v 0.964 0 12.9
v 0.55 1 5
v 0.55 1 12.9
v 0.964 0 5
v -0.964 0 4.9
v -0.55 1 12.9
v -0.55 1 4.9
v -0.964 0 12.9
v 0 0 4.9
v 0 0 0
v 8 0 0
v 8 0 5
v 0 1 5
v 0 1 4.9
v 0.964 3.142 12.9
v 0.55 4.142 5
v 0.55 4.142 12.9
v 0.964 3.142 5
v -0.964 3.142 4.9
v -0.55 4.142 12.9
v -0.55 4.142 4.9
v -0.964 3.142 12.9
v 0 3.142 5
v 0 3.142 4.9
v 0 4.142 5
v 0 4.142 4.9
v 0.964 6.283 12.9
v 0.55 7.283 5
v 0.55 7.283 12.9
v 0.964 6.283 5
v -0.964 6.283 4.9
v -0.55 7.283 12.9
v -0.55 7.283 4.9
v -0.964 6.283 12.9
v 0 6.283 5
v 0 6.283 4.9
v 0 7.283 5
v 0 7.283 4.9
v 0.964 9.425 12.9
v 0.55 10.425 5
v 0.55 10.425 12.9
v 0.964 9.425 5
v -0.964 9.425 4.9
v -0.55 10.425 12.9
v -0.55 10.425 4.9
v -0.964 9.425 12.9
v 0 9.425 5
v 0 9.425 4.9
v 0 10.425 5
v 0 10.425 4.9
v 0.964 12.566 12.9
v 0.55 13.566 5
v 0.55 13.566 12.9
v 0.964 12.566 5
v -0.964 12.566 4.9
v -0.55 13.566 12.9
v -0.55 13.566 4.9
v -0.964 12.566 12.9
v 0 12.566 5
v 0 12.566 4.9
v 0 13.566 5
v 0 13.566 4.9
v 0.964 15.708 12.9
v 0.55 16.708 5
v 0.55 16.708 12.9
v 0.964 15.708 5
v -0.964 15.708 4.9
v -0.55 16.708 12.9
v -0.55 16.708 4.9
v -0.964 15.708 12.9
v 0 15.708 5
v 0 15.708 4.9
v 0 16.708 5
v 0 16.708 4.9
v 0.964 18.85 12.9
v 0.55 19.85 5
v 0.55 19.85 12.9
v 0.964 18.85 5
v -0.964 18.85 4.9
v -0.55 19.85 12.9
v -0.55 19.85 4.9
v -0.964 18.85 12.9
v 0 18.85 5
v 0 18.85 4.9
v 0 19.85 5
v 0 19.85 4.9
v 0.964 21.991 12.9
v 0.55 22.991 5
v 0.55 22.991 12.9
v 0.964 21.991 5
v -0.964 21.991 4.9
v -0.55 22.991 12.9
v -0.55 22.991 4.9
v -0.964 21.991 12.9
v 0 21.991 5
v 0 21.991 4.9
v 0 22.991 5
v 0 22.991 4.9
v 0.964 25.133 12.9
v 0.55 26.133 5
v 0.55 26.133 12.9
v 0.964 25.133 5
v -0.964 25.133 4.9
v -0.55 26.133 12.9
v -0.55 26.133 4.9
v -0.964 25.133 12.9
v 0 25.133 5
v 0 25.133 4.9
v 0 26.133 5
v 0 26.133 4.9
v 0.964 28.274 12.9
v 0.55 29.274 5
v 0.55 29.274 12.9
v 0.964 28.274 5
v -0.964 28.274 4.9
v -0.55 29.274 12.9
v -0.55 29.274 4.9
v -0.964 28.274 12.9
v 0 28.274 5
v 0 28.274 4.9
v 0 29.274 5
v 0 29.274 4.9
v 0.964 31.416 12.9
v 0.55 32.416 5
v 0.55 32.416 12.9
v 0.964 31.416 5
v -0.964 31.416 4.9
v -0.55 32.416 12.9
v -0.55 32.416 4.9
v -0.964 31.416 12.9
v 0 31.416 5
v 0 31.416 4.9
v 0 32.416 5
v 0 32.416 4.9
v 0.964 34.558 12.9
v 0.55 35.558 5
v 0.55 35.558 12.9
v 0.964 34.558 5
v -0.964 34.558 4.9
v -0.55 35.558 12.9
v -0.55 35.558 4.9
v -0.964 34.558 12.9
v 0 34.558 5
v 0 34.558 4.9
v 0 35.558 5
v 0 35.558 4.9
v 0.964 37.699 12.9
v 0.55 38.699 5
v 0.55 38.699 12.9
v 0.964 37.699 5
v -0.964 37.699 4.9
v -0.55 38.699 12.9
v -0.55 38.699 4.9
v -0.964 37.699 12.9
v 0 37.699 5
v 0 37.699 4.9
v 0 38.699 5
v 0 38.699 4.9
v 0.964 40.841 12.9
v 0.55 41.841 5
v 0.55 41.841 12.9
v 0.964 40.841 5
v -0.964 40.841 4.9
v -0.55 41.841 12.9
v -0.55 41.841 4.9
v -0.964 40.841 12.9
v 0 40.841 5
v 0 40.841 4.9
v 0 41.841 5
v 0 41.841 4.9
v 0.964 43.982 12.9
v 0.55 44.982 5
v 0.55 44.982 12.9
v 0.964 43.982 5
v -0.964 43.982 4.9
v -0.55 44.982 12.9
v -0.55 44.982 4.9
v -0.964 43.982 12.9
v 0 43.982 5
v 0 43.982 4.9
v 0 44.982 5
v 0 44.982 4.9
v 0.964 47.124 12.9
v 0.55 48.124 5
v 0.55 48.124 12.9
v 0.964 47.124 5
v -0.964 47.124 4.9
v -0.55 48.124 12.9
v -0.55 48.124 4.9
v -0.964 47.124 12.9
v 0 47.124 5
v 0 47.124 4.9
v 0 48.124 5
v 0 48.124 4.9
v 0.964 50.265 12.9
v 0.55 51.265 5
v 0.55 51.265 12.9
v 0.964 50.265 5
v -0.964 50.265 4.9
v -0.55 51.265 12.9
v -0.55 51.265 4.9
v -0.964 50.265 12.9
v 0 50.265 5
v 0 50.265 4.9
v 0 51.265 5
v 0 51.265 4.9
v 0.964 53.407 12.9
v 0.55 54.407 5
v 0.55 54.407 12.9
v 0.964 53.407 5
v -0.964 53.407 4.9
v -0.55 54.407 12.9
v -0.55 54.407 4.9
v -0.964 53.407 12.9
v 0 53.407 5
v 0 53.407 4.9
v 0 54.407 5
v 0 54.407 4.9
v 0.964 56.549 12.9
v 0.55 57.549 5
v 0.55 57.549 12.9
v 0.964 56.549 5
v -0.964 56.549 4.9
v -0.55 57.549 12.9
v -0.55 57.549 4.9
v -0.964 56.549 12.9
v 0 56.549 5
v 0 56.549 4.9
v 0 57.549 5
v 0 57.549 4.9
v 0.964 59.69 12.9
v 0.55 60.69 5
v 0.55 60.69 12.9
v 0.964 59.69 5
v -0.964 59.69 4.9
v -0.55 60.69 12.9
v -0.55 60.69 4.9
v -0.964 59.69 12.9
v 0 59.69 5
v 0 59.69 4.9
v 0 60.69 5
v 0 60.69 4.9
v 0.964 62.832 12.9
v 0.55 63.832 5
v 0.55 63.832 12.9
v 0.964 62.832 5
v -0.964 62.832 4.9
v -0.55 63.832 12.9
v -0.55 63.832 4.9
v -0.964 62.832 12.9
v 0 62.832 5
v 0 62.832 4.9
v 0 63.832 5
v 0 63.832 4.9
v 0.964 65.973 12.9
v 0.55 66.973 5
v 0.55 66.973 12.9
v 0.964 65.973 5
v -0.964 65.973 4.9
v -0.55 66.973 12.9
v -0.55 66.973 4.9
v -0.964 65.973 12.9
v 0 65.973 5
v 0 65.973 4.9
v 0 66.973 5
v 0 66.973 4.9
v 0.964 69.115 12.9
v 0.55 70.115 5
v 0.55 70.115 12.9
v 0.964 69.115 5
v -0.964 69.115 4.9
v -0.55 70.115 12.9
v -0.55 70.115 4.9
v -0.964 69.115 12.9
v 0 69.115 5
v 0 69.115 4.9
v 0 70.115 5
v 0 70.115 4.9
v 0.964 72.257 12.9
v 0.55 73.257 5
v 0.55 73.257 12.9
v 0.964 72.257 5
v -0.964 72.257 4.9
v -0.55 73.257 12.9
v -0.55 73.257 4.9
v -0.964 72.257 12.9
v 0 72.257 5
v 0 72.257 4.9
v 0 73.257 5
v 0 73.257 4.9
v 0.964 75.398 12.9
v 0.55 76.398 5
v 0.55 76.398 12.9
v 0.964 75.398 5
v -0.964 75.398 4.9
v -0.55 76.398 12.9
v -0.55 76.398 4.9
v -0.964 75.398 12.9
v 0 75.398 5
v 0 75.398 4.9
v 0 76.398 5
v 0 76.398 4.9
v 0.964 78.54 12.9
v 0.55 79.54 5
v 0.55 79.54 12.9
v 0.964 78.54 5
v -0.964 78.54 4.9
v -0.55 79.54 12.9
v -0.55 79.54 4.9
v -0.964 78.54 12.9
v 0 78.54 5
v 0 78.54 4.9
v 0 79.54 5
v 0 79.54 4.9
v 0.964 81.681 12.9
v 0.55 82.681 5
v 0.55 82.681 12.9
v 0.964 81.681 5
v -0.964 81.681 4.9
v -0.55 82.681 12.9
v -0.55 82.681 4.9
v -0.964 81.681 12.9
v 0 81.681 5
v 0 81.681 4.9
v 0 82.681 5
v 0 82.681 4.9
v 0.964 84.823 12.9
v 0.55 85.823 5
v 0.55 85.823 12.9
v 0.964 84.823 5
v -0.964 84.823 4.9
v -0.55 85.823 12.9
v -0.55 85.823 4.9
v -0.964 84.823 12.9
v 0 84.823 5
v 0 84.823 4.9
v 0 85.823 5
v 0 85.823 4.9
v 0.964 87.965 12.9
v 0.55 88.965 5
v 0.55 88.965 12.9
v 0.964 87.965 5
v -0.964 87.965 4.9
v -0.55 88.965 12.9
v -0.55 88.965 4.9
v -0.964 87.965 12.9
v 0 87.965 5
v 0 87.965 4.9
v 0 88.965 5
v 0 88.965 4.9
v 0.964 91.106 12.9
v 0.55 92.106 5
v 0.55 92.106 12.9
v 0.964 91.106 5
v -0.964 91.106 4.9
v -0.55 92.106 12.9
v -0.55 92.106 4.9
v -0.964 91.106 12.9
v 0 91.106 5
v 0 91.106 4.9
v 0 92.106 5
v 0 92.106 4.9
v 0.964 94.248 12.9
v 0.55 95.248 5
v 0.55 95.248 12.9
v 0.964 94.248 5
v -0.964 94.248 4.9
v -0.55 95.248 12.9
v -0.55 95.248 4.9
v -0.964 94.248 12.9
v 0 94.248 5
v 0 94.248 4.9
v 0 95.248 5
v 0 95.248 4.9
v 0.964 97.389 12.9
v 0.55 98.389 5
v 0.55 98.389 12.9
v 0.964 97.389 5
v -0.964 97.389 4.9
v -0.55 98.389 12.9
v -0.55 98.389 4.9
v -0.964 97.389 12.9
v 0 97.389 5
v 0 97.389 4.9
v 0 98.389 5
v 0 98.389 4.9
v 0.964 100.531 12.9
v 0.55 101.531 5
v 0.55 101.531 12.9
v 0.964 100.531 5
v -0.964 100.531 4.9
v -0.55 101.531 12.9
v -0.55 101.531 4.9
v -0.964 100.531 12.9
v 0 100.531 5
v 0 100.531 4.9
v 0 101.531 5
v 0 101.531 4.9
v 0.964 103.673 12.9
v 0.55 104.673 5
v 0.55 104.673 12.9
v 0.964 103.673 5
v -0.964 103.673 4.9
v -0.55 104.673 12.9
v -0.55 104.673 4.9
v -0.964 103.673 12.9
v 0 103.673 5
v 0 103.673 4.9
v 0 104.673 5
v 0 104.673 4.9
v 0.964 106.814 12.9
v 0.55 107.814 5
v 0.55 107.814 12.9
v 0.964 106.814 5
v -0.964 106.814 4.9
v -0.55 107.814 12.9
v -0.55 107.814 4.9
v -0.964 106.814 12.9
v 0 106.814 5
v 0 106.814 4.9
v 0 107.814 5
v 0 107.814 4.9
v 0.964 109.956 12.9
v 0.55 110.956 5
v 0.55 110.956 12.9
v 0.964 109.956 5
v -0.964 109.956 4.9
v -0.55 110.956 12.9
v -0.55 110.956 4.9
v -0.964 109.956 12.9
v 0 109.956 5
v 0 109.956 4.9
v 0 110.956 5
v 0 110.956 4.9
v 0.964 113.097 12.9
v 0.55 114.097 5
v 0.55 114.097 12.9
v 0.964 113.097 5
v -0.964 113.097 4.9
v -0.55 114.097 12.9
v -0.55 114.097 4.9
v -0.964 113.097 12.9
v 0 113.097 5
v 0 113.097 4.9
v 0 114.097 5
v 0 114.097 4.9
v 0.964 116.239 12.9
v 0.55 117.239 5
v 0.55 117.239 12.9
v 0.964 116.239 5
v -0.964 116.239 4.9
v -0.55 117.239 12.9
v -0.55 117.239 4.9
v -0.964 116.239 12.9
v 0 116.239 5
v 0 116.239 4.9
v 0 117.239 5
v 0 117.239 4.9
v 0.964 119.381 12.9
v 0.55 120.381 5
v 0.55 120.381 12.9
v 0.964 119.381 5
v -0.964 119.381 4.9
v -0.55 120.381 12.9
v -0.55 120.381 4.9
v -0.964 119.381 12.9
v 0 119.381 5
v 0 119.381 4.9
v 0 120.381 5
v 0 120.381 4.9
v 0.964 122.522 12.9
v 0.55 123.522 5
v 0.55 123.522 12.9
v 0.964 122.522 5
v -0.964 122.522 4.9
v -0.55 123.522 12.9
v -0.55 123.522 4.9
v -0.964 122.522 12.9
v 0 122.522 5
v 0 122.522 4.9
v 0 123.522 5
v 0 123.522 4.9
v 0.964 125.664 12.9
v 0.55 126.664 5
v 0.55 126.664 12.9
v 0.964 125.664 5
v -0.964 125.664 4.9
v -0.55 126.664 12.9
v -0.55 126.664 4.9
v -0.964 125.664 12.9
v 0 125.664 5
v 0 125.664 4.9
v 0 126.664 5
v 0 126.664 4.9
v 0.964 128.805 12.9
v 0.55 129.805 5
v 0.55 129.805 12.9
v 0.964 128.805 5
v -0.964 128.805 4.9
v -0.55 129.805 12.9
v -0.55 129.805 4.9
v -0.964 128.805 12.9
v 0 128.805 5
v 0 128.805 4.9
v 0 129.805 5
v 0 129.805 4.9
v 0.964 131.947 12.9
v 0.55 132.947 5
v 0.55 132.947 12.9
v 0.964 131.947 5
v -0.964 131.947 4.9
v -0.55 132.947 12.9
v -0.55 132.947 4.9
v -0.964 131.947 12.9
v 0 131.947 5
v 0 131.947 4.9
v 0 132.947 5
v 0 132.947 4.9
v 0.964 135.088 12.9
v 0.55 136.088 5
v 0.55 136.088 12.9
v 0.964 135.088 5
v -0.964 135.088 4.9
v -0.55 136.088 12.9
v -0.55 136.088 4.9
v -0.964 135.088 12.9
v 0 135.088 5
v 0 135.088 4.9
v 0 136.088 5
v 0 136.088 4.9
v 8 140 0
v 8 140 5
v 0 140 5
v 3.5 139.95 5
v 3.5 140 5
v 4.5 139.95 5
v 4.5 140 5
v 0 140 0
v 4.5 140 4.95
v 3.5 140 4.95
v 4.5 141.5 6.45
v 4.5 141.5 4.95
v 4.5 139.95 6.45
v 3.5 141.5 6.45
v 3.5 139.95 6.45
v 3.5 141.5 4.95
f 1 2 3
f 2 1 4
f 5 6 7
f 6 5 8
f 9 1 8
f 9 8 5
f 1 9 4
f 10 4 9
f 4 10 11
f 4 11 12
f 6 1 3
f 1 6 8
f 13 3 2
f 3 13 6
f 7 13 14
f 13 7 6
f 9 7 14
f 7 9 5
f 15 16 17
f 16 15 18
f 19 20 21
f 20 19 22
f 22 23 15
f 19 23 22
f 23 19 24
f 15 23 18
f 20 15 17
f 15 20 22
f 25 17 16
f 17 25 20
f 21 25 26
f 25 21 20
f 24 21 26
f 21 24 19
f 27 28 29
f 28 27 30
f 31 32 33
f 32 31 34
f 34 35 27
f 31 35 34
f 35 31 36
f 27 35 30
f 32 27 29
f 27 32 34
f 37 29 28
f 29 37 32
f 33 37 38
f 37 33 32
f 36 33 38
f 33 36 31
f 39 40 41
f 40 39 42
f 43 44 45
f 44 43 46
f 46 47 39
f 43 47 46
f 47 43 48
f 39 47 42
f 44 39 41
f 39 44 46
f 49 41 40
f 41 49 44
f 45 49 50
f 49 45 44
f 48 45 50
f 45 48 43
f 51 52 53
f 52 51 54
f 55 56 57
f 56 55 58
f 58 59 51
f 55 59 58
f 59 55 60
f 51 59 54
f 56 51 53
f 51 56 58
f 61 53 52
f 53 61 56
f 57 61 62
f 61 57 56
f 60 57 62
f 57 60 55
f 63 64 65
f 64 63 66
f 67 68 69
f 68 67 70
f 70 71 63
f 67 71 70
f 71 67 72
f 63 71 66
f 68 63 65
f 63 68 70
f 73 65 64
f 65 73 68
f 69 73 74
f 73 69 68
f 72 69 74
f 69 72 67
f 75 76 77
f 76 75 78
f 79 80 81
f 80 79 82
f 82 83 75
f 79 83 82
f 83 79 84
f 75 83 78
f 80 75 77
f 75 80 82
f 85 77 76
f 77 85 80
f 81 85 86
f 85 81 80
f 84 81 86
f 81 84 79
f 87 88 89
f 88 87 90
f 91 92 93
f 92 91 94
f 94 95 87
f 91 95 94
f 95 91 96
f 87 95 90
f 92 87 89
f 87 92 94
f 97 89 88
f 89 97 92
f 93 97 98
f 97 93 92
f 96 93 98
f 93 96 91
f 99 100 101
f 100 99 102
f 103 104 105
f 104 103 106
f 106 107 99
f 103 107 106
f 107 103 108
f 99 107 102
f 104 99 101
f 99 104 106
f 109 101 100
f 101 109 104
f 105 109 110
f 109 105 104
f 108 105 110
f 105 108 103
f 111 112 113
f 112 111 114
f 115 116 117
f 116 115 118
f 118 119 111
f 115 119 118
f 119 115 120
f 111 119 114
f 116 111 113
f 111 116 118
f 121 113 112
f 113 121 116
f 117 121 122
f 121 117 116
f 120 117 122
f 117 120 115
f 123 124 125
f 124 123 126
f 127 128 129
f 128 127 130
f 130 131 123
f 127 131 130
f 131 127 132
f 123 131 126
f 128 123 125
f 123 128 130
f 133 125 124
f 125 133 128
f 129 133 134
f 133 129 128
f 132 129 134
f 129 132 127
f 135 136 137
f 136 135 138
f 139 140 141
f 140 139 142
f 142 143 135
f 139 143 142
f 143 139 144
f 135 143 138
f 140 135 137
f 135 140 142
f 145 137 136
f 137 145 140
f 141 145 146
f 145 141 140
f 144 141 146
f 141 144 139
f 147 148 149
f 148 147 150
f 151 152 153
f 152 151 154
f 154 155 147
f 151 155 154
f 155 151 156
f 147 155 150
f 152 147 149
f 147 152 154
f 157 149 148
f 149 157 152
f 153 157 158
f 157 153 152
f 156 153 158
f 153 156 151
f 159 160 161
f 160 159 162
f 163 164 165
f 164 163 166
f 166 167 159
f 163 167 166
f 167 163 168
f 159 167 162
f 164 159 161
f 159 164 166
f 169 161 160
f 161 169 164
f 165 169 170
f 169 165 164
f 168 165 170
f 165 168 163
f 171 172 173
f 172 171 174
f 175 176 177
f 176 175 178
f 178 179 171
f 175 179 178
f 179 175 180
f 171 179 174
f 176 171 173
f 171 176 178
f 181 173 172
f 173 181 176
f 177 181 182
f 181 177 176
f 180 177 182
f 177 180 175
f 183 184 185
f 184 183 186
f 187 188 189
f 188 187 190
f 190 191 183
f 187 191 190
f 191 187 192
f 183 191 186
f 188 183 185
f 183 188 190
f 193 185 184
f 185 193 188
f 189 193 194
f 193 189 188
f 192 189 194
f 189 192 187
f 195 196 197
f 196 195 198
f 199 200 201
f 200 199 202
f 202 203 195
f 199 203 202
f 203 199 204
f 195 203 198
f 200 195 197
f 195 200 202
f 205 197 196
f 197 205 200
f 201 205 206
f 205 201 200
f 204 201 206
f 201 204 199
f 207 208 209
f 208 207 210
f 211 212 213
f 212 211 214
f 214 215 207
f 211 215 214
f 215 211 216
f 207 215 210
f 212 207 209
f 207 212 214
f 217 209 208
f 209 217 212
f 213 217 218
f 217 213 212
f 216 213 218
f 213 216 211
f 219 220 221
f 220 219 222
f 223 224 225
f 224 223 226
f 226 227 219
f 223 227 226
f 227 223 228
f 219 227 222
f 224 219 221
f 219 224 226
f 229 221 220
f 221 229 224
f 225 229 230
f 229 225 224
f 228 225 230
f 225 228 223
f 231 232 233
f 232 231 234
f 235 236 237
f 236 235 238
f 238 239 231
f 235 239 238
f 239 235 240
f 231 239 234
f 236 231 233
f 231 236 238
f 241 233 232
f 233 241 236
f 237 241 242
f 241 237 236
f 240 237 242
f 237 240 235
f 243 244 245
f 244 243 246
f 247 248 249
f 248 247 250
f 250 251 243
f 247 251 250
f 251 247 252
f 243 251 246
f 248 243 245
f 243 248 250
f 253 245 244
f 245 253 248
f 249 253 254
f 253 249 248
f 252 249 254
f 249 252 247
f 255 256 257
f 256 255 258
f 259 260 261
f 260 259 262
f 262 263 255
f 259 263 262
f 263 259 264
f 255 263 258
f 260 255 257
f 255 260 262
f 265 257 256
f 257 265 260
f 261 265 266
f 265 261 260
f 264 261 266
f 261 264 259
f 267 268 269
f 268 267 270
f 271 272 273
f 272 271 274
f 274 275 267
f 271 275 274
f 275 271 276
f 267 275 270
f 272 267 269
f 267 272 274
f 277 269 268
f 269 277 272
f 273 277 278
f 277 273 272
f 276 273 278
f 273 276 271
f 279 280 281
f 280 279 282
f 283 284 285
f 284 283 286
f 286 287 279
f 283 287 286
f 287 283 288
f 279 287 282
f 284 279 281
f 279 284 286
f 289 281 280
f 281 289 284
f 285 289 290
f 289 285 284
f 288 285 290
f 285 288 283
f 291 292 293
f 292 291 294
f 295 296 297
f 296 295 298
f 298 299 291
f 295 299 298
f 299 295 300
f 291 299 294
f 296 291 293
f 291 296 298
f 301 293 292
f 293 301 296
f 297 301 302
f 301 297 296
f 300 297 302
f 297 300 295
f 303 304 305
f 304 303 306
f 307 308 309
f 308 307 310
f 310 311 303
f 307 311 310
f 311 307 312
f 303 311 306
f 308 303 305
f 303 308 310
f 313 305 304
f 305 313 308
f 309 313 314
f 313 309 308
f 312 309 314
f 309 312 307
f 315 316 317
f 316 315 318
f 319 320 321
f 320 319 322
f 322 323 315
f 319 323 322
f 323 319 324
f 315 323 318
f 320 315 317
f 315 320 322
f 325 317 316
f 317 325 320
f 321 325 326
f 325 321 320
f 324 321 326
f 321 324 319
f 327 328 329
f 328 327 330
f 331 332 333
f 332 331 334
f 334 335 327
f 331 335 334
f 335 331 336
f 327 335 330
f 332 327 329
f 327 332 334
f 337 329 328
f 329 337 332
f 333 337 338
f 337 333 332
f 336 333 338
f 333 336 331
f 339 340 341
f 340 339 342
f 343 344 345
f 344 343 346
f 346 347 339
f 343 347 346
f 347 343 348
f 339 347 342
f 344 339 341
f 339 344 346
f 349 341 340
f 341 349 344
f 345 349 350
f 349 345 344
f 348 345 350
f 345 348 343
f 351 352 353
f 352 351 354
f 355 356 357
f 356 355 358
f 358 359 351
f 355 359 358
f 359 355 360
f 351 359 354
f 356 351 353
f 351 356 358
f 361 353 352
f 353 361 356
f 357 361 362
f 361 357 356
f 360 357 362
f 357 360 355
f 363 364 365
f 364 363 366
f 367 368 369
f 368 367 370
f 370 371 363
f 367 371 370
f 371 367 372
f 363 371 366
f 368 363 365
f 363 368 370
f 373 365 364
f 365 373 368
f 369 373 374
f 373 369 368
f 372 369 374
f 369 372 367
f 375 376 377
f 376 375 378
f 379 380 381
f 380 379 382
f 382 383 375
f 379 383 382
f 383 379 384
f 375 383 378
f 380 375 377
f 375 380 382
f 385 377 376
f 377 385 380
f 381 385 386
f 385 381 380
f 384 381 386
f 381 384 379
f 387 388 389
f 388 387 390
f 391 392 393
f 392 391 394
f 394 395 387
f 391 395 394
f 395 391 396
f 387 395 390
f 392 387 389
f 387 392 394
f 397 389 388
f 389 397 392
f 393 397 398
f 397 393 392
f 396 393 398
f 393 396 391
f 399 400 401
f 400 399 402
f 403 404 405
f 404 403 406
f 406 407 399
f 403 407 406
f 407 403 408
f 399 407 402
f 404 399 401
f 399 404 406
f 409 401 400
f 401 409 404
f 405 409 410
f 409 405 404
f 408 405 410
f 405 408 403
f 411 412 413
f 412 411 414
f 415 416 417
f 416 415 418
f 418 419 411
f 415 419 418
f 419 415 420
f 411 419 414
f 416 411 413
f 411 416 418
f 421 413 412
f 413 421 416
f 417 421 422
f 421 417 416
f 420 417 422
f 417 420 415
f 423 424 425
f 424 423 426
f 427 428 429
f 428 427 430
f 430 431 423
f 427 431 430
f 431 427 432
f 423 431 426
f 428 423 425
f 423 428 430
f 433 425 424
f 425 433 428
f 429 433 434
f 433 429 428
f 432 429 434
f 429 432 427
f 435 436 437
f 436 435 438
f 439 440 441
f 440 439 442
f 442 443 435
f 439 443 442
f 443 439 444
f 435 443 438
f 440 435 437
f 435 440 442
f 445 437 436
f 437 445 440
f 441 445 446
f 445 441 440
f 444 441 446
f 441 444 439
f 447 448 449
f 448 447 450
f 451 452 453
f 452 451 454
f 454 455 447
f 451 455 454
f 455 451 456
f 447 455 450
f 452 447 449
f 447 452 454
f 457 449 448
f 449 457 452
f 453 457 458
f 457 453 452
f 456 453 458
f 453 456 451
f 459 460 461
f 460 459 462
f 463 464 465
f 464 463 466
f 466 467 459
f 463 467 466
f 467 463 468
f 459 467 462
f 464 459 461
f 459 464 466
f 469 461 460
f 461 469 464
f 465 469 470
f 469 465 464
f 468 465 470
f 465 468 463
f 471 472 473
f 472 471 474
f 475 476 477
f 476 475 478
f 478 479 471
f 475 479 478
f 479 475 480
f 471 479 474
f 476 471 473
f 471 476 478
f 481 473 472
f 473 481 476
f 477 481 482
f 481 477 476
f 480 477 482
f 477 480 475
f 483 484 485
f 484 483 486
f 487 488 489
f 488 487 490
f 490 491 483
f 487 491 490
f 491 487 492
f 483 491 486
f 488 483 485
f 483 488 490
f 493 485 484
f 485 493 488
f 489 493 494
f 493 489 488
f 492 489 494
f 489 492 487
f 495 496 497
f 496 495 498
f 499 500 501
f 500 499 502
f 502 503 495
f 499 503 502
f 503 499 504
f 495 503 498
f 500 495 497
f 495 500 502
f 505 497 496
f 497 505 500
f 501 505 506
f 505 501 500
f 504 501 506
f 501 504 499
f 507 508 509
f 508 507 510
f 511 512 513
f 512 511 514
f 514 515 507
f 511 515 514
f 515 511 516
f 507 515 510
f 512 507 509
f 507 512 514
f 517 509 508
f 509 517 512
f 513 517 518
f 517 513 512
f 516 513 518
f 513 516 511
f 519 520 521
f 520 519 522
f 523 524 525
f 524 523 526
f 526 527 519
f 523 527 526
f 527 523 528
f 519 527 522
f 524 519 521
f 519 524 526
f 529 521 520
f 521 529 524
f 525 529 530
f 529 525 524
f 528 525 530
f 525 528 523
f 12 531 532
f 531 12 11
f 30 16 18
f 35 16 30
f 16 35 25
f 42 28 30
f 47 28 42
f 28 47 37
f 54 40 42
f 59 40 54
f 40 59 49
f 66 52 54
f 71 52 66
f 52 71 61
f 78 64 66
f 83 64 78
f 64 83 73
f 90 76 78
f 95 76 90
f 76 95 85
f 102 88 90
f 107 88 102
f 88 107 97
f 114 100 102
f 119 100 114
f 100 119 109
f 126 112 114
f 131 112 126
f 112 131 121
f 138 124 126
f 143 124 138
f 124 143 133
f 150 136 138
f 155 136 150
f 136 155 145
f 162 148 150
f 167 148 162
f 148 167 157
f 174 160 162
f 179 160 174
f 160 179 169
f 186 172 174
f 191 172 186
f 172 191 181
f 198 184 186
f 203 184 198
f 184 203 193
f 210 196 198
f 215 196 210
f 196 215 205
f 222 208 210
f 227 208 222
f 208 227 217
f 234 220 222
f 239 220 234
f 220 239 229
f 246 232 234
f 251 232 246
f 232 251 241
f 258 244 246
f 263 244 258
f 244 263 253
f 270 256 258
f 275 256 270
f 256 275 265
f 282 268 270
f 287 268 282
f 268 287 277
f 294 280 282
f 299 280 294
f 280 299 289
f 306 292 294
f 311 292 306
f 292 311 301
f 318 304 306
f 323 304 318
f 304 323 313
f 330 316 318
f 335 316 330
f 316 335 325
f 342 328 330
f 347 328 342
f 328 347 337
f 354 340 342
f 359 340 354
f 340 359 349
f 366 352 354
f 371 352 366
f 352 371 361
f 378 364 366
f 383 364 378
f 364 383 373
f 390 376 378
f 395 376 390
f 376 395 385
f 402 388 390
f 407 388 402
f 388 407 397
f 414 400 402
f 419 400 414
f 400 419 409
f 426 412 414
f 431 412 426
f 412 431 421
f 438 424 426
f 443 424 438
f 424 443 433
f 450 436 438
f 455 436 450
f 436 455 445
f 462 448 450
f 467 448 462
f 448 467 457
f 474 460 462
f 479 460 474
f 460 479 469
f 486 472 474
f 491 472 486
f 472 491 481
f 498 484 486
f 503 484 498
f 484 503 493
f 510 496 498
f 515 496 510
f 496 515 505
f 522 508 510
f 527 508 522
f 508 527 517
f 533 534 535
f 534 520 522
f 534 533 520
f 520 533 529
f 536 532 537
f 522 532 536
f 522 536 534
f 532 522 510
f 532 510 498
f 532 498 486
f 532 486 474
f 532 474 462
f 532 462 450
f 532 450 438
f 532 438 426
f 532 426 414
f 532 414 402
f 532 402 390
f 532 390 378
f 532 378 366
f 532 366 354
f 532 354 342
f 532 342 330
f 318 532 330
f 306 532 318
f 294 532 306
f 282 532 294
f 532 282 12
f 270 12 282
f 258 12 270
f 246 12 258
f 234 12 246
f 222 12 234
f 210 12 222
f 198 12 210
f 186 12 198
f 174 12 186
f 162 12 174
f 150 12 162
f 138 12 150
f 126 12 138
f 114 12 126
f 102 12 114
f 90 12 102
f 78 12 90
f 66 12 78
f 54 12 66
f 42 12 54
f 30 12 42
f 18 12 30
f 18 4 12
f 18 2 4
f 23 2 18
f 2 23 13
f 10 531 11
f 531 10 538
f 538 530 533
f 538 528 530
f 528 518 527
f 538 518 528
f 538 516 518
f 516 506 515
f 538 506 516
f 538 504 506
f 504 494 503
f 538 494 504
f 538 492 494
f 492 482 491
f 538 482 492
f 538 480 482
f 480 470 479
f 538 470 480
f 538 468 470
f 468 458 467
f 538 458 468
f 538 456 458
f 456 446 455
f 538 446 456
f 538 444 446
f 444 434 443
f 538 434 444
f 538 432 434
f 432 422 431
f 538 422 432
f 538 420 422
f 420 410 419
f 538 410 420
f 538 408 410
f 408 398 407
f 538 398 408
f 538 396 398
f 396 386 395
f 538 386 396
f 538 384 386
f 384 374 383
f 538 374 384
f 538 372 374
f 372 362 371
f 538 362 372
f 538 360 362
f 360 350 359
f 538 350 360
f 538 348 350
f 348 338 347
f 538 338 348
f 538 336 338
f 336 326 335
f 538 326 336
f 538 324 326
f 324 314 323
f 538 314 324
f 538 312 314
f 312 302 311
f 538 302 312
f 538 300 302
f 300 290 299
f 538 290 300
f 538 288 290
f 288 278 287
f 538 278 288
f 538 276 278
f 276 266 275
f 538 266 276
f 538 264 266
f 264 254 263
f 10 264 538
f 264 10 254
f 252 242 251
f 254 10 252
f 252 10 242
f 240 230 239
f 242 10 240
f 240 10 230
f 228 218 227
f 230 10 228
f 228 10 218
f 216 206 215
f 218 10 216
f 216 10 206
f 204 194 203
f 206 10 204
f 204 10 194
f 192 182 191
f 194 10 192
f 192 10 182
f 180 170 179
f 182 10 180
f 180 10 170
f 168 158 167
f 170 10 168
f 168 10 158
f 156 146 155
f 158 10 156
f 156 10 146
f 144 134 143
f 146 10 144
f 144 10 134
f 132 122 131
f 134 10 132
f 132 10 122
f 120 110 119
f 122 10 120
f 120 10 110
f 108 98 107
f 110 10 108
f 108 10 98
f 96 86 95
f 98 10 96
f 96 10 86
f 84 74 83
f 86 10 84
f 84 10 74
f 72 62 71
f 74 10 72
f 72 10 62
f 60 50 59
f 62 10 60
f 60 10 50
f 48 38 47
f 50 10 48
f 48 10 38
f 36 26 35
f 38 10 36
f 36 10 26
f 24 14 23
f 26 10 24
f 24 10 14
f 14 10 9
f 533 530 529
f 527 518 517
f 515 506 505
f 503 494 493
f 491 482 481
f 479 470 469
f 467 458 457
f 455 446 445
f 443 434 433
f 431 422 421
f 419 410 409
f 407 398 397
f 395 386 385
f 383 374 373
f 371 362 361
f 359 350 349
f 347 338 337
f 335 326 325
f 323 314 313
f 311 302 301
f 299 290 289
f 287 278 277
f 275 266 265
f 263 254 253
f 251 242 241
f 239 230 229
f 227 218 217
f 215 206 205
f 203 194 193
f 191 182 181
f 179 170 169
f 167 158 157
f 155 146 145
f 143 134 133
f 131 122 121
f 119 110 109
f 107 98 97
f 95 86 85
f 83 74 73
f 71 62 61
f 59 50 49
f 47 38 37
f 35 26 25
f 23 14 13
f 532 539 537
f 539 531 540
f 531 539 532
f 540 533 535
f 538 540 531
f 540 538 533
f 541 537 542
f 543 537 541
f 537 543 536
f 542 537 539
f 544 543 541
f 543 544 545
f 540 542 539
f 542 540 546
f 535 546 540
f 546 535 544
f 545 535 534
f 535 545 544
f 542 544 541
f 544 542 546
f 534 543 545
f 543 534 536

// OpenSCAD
// file: rack_params.scad
// 推出模块共享参数 - 所有零件文件和装配预览文件通过 include 引用此文件
// 此文件仅放参数定义（变量赋值），不放任何 geometry 语句

// ---------- 底板参数 (引用自 sliding_track_base.scad) ----------
base_w   = 30;
base_l   = 90;
base_t   = 5;
groove_w = 26;
groove_d = 1.5;

// ---------- 齿条参数 ----------
modulus     = 1.0;                    // 齿轮模数
pitch       = PI * modulus;           // 齿距 p
addendum    = 1.0 * modulus;          // 齿顶高
dedendum    = 1.2 * modulus;          // 齿根高
tooth_thick = pitch / 2;              // 齿厚

rack_w     = 8;                       // 齿条宽 (X)
rack_thick = 3.5;                     // 齿条厚 (Z) - 仅含齿高部分（与齿轮啮合计算用）
rack_base_h = 5;                      // 齿条基体加厚高度（专门为底部粘贴预留），不含齿高
rack_len   = 140;                     // 齿条长 (Y) — 由原 70mm 改为 140mm
tooth_cnt  = floor(rack_len / pitch); // 齿条齿数

// ---------- 推头参数 ----------
pusher_w     = 23;                    // 推头宽 (< groove_w=26)
pusher_tab_t = 1.5;                   // 竖板厚 (< groove_d=1.5)
pusher_arm_t = 1.5;                   // 横板厚
blocker_h    = 20;                    // 竖板总高度（从齿条顶面起算）= 底板厚(5) + 药盒高(13.5) + 余量(1.5)
                                     //  作用：推头到达行程终点时高出底板 15mm 堵住上方药匣出药口

// ---------- 齿轮参数 ----------
gear_teeth   = 20;                    // 齿轮齿数
gear_r       = gear_teeth * modulus / 2;   // 分度圆半径
gear_outer_r = gear_r + addendum;          // 齿顶圆半径
gear_root_r  = gear_r - dedendum;          // 齿根圆半径
gear_w       = rack_w;                     // 齿轮厚度 (Z)
shaft_d      = 6.5;                         // 电机轴径（6.5mm 轴孔）
shaft_len    = 20;                         // 轴长

// ---------- 轴座参数 ----------
bearing_block_w = 12;
bearing_block_d = 10;
bearing_block_h = 8;
bearing_hole_d  = 6.7;                     // 6.5mm电机轴 + 0.2mm间隙
mount_hole_d    = 3.2;                     // M3 安装孔

// ---------- 装配坐标 ----------
rack_x   = (base_w - rack_w) / 2;         // 齿条X起点 (底板X中心)
rack_z   = -rack_thick;                   // 齿条Z底面 (底板Z=0下方)
rack_y0  = -20;                           // 齿条Y起点 (在底板Y=0外)

gear_cx = base_w / 2;                     // 齿轮X中心
gear_cy = base_l - 5;                     // 齿轮Y中心 (底板Y=90末端内侧)
gear_cz = rack_z + rack_thick / 2;        // 齿轮Z中心 (齿条厚度中线)

bearing_y   = gear_cy;                    // 轴座Y中心
mount_inset = 5;
eps         = 0.01;
// main file
// stick_rack.scad - 齿条基体（厚 5mm 粘接面）+ 齿（在顶面之上）+ T 型键
// 坐标系：齿条左下角 (X=0, Y=0, Z=0) 在基体底面（粘贴面）
// 顶面：Z = rack_base_h = 5（齿条基体顶面）
// 齿尖：Z = rack_base_h + addendum = 5 + 1 = 6
// T 型键：位于 Y=rack_len 端，向 Y+ 凸出 1.5mm，高 1.5mm（在基体顶部）

include <rack_params.scad>

module body() {
    // 齿条基体：X=rack_w, Y=rack_len, Z=rack_base_h=5
    // 底面 Z=0 是平整的（用于粘贴）
    // 顶面 Z=5 是齿的起始面
    color("SteelBlue")
    cube([rack_w, rack_len, rack_base_h]);
}

module teeth() {
    // 齿：位于基体顶面之上，齿高 = addendum = 1mm
    // 齿底部 Z = rack_base_h - 0.1（0.1mm overlap 与基体融合避免非流形）
    color("SteelBlue")
    for (i = [0 : tooth_cnt - 1]) {
        translate([0, i * pitch, rack_base_h - 0.1])
            linear_extrude(height = rack_w)
                rack_tooth_profile();
    }
}

module t_key() {
    // T 型键：位于齿条 Y=max 端，X 居中，向 Y+ 凸出 1.5mm
    // 底面 Z = rack_base_h - 0.05（与基体顶面 0.05mm overlap 避免非流形）
    // 顶面 Z = rack_base_h + 1.45
    color("OrangeRed")
    translate([(rack_w - 1.0) / 2, rack_len - 0.05, rack_base_h - 0.05])
        cube([1.0, 1.55, 1.5]);
}

module rack_tooth_profile() {
    tooth_half = tooth_thick * 0.55;
    top_half   = tooth_thick * 0.35;
    polygon(points = [
        [-tooth_half - 0.1, 0],
        [ tooth_half + 0.1, 0],
        [ top_half,          addendum],
        [-top_half,          addendum]
    ]);
}

module stick_rack() {
    union() {
        body();
        teeth();
        t_key();
    }
}

stick_rack();
